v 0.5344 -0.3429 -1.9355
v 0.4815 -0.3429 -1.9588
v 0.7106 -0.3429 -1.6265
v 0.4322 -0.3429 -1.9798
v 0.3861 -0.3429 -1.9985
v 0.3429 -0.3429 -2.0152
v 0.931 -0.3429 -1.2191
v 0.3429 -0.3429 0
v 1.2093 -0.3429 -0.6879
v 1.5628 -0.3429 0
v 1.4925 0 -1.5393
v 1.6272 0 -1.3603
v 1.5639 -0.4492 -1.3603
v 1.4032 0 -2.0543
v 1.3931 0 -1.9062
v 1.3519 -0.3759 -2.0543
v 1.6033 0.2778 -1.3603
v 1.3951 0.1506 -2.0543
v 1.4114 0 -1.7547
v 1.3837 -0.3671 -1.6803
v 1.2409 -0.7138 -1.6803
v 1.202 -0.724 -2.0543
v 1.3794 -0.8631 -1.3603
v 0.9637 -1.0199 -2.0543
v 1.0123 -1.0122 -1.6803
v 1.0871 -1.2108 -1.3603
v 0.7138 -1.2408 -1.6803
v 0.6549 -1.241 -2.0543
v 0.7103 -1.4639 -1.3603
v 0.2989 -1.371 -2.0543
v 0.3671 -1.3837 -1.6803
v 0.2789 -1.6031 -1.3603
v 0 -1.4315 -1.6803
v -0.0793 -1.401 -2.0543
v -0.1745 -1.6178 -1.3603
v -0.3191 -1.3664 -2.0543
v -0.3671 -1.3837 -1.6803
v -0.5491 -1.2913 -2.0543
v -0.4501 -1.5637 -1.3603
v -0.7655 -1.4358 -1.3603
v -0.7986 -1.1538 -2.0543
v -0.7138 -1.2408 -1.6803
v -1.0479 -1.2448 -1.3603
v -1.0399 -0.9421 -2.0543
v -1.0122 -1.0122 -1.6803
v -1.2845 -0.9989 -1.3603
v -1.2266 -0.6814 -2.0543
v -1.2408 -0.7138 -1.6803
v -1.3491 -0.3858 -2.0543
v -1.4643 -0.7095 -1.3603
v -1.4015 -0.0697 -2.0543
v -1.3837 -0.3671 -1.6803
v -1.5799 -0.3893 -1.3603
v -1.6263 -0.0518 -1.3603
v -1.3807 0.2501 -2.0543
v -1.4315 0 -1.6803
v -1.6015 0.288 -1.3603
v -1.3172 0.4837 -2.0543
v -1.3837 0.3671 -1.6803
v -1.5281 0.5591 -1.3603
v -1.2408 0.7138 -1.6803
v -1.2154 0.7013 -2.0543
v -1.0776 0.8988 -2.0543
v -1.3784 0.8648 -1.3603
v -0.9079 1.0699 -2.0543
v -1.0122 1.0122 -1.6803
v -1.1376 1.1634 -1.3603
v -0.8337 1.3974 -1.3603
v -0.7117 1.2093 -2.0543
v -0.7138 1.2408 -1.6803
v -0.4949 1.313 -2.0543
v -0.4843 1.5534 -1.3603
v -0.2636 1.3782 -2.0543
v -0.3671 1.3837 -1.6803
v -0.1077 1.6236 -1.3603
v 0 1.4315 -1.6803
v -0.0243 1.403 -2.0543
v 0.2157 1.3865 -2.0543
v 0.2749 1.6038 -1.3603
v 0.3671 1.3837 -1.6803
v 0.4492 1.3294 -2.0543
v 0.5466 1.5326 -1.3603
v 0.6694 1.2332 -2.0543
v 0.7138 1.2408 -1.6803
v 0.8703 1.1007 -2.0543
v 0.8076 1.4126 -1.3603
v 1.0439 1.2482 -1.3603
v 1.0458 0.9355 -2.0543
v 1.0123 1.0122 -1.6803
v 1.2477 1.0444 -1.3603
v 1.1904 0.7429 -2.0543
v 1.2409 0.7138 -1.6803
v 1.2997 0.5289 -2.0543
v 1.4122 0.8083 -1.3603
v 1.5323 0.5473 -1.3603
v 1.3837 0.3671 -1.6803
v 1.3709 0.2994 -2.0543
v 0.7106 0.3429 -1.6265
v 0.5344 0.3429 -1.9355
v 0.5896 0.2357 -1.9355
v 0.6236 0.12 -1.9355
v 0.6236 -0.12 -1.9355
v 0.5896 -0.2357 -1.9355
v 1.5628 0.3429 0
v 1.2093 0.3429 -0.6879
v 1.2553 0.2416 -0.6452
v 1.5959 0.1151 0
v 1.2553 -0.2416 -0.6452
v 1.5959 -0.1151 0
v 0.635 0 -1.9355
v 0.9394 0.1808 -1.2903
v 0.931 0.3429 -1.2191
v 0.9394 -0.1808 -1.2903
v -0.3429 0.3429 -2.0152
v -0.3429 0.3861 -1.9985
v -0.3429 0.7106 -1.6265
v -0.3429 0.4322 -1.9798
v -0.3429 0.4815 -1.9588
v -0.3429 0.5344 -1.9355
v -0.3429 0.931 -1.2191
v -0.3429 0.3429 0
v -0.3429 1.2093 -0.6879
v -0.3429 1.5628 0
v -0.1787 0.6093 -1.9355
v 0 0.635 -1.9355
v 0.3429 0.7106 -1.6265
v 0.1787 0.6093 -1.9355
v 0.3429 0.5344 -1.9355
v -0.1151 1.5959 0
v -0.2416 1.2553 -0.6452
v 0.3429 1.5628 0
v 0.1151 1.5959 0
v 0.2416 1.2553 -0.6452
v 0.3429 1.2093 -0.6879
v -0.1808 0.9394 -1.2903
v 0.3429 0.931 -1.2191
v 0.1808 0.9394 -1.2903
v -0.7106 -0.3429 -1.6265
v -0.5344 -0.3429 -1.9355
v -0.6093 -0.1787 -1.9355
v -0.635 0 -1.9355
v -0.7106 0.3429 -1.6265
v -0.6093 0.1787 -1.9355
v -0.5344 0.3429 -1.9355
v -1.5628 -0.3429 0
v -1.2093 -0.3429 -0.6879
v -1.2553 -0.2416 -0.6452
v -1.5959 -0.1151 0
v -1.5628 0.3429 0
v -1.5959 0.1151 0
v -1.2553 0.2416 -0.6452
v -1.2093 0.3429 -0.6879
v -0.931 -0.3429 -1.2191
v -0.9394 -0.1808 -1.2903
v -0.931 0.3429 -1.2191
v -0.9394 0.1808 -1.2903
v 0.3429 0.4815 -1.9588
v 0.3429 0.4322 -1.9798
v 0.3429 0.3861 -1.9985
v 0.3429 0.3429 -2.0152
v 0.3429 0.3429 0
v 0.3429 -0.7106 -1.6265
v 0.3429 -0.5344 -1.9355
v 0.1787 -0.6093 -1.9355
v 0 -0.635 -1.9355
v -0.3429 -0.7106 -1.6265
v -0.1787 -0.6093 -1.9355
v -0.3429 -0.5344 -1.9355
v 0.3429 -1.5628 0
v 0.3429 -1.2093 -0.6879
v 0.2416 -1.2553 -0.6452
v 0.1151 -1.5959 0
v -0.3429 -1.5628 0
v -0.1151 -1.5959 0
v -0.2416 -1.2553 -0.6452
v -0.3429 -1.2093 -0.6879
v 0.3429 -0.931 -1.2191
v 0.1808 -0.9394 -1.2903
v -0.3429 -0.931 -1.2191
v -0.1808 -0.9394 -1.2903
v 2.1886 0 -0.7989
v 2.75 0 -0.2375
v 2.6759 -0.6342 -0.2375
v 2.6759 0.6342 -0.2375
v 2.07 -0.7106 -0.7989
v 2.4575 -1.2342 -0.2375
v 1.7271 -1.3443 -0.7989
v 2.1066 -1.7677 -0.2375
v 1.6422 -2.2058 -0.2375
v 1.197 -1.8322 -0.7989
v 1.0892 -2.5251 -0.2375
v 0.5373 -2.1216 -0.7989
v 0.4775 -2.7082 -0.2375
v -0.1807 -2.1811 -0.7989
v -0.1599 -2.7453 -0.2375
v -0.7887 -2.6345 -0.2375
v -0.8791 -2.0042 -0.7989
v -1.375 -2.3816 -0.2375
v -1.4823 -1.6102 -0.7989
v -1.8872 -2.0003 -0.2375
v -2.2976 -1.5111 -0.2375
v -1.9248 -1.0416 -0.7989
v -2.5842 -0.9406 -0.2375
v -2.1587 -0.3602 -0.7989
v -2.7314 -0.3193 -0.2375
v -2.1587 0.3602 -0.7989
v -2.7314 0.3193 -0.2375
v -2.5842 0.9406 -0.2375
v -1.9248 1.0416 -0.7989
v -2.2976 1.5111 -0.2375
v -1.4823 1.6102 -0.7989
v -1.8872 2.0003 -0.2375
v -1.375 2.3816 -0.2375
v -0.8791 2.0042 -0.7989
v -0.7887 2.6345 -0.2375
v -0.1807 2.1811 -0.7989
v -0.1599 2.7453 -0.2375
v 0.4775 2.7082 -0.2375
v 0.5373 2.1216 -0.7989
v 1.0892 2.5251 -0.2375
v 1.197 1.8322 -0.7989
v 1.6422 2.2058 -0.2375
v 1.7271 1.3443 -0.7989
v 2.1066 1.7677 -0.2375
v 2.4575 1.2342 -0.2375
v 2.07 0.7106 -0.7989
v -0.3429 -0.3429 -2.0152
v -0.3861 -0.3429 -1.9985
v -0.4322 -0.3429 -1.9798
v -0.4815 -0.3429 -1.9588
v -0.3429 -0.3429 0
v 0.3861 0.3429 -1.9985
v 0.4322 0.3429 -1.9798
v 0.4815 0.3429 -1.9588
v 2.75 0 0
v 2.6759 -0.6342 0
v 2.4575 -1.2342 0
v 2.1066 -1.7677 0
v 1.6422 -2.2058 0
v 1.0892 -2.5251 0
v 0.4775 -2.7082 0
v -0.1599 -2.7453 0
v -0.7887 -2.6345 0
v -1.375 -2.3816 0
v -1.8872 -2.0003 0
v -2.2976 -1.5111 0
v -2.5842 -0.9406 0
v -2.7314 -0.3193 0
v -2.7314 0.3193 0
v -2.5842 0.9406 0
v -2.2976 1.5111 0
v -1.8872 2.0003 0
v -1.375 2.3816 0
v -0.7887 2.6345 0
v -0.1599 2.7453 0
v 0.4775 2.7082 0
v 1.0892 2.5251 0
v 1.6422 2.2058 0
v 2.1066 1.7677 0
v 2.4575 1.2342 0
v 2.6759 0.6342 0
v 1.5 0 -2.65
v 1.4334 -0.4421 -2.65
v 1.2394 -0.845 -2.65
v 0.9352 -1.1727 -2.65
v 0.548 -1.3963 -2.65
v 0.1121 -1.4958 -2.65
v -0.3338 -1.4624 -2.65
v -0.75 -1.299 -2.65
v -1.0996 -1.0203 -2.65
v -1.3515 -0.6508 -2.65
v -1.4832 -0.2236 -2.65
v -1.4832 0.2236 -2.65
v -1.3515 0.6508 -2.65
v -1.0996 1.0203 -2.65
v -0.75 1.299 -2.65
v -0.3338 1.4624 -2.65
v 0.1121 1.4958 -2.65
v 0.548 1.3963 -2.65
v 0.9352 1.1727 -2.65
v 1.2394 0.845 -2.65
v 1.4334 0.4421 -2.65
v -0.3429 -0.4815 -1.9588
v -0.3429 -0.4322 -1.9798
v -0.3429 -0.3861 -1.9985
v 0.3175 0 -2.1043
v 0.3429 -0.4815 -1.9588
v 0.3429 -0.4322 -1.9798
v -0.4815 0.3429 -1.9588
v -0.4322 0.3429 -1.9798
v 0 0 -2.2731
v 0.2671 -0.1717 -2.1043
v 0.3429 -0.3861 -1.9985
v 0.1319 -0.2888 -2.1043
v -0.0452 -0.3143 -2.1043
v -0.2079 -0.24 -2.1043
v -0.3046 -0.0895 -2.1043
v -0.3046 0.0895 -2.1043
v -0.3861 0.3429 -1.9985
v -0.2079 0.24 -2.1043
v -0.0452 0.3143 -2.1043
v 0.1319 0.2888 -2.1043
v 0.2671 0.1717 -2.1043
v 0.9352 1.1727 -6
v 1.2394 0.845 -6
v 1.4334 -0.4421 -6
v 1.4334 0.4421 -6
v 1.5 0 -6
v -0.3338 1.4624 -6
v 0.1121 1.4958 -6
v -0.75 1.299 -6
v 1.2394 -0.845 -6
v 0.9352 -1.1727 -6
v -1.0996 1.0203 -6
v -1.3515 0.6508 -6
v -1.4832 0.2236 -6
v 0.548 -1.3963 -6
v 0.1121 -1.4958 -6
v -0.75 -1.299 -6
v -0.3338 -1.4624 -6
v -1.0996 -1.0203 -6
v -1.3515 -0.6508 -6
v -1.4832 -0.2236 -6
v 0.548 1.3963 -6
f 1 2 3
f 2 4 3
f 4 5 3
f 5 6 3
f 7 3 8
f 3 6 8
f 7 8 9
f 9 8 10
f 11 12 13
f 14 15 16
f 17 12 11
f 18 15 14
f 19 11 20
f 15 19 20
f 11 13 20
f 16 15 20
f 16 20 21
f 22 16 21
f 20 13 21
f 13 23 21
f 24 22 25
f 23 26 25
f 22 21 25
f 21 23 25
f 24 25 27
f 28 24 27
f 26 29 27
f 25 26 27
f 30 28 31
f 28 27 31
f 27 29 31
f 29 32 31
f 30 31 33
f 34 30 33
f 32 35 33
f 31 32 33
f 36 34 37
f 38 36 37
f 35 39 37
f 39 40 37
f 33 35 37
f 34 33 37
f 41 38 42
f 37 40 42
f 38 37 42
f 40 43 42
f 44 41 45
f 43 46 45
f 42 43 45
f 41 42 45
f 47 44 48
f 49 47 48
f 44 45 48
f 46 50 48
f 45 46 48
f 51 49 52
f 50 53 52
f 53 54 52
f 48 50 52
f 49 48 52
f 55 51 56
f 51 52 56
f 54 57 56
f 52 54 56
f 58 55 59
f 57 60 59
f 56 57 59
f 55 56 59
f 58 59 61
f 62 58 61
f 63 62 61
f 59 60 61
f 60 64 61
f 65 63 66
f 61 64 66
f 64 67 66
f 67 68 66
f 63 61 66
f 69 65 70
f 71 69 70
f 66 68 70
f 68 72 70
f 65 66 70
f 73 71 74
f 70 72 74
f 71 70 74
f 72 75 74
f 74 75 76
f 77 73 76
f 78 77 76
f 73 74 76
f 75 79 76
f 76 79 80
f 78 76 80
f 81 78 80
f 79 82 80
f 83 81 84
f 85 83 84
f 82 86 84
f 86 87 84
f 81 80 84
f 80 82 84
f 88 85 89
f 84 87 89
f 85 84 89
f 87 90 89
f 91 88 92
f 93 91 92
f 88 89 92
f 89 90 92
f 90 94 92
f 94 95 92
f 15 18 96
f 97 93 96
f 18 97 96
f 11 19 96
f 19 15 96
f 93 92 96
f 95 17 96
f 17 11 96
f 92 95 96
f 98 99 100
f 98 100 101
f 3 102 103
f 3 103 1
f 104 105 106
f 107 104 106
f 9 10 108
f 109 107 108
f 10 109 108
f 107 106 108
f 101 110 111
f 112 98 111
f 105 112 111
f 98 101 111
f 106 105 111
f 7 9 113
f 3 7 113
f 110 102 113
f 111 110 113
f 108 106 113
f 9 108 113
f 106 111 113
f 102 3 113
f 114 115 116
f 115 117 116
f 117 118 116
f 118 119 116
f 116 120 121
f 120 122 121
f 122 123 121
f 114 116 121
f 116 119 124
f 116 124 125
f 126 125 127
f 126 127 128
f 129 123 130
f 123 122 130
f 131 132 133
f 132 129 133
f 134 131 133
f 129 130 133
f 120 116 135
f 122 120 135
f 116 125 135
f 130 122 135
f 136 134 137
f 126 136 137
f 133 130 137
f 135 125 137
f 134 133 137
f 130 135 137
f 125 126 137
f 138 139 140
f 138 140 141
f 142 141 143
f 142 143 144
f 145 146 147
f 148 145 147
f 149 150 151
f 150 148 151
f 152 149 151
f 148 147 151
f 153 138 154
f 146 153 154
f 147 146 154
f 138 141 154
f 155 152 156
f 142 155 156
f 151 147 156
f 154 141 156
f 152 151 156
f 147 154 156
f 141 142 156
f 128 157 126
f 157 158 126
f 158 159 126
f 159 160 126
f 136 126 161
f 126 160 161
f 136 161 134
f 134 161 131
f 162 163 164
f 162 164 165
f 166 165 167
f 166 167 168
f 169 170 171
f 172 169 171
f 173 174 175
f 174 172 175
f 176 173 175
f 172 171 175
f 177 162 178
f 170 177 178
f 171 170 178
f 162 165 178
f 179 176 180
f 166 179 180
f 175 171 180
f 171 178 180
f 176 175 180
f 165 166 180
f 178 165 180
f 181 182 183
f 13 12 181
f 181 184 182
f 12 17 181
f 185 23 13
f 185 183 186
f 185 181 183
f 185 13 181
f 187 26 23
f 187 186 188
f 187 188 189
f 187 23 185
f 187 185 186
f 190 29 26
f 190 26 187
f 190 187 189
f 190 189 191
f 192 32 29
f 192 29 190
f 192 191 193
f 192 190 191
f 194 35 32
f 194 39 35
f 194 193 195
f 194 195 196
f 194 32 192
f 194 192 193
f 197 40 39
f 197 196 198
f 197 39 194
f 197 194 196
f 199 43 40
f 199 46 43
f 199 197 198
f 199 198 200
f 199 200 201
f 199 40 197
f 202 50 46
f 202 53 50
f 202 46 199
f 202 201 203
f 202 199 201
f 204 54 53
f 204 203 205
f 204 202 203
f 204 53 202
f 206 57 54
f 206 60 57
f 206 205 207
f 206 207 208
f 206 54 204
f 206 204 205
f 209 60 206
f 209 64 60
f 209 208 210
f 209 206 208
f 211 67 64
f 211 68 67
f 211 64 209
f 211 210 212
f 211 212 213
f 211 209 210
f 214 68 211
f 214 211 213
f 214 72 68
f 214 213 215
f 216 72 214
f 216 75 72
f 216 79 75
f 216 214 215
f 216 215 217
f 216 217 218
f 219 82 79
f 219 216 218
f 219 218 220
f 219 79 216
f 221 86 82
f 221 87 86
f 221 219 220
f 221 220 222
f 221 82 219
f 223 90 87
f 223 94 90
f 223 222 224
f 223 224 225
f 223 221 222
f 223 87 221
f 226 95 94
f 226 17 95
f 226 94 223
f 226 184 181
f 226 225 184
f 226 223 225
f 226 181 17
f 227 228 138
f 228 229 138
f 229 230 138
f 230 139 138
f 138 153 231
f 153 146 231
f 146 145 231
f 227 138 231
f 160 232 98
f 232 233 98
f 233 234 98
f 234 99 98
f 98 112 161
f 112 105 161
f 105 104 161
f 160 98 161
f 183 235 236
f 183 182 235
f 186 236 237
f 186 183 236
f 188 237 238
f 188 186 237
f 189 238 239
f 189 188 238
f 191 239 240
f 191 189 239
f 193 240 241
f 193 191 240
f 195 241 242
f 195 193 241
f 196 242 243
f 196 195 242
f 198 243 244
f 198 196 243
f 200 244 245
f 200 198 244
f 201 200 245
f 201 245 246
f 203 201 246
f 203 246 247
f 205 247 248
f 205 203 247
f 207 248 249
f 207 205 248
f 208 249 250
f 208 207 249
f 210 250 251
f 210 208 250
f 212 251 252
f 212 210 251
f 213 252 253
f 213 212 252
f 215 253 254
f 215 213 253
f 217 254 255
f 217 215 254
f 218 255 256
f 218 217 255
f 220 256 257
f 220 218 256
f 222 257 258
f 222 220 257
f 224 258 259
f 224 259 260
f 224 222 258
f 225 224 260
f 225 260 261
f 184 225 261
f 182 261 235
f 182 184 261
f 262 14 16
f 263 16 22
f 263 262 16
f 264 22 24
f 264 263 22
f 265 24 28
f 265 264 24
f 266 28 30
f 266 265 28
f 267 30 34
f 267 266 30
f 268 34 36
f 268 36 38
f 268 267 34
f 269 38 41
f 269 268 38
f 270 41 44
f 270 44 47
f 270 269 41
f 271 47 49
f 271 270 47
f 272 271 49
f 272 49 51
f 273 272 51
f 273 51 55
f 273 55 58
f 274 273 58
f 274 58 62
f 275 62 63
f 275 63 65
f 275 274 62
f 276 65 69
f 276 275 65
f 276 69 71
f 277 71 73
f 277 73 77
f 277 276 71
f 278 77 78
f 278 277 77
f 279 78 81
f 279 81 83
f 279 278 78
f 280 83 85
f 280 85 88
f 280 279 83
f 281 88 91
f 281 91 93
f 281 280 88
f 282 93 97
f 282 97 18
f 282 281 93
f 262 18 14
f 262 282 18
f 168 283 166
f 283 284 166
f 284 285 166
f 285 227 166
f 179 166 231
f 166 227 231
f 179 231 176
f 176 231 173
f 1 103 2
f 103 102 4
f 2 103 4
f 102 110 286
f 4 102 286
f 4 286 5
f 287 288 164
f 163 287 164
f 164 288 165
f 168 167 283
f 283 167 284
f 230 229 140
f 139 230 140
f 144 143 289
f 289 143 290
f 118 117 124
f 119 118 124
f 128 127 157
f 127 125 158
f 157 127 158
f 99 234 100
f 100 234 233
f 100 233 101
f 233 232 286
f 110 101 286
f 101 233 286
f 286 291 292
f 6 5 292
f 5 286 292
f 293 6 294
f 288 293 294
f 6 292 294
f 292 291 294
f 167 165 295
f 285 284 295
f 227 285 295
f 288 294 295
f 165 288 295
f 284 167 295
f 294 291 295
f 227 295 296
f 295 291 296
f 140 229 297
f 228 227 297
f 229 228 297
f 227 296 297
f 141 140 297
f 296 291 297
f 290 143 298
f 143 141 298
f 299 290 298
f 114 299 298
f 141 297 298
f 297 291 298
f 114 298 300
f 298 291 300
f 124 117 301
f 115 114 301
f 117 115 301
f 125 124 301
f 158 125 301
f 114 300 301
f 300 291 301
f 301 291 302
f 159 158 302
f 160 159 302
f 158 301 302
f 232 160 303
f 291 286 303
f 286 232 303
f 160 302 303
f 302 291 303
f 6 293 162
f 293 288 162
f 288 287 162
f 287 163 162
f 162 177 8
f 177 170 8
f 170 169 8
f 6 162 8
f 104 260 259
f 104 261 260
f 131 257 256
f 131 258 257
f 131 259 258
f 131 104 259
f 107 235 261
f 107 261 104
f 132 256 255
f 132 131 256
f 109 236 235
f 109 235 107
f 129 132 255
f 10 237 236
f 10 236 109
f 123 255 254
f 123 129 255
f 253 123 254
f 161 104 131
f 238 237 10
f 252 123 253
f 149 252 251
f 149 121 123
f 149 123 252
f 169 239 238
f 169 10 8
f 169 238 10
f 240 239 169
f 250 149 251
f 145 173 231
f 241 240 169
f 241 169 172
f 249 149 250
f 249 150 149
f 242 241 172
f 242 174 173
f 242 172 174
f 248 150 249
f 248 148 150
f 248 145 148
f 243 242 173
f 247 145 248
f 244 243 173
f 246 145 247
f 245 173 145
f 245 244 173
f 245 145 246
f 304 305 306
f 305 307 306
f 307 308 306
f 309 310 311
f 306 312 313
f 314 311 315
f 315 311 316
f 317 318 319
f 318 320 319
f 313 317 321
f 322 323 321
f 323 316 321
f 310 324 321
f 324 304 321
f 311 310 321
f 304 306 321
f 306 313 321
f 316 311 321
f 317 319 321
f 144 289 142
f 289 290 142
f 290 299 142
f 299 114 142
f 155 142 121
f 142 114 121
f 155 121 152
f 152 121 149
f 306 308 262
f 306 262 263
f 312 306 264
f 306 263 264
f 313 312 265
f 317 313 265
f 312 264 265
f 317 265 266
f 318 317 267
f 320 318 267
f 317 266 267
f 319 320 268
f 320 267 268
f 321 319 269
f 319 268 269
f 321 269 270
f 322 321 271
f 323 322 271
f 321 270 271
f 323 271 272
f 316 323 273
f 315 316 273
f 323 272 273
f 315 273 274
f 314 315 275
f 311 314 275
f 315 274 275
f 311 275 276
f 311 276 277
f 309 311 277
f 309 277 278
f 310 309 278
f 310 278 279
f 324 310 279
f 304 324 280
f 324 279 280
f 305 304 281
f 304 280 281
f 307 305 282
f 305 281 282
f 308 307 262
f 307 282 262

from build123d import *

# Parameters (mm, degrees)
CROSS_DEPTH       = 3.2
CIRPATTERN1_COUNT = 4
FILLET1_R         = 0.8


with BuildPart() as part:
    # Sketch1 → RevolveBase (revolve)
    with BuildSketch(Plane(origin=(0, 0, 0), x_dir=(0, 0, -1), z_dir=(1, 0, 0)), mode=Mode.PRIVATE) as revolvebase_sk:
        Polygon((0, 0), (0, 2.75), (0.2375, 2.75), (1.65, 1.3375), (1.65, 1.65), (6, 1.65), (6, 0), align=None)
    revolve(revolvebase_sk.sketch.rotate(Axis((0, 0, 0), (0, 0, -1)), 90), axis=Axis((0, 0, 0), (0, 0, -1)))

    # Sketch3 → Cross (cut)
    with BuildSketch(Plane.XY):
        with BuildLine():
            Line((-0.342946789, 0), (0.342946789, 0))
            Line((0.342946789, 0), (0.342946789, 1.562813968))
            ThreePointArc((0.342946789, 1.562813968), (0, 1.6), (-0.342946789, 1.562813968))
            Line((-0.342946789, 1.562813968), (-0.342946789, 0))
        make_face()
    cross = extrude(amount=-CROSS_DEPTH, mode=Mode.SUBTRACT)

    # CirPattern1: Cross ×4 about axis
    cirpattern1_axis = Axis((0, 0, 0), (0, 0, 1))
    for i in range(1, CIRPATTERN1_COUNT):
        add(cross.rotate(cirpattern1_axis, i * 360 / CIRPATTERN1_COUNT), mode=Mode.SUBTRACT)

    # Sketch5 → RevolveRod (revolve)
    with BuildSketch(Plane(origin=(0, 0, 0), x_dir=(0, 0, -1), z_dir=(1, 0, 0)), mode=Mode.PRIVATE) as revolverod_sk:
        Polygon((0, 2.102030651), (0, 1.6), (1.935490568, 0.635), (2.273126058, 0), (6, 0), (6, 1.5), (1.65, 1.5), (1.65, 1.3375), (0.885469349, 2.102030651), align=None)
    revolve(revolverod_sk.sketch.rotate(Axis((0, 0, 0), (0, 0, -1)), 90), axis=Axis((0, 0, 0), (0, 0, -1)))

    # Sketch7 → CutBody (revolve, cut)
    with BuildSketch(Plane(origin=(0, 0, 0), x_dir=(0, 0, -1), z_dir=(1, 0, 0)), mode=Mode.PRIVATE) as cutbody_sk:
        Polygon((1.65, 3.5), (1.65, 1.3375), (2.65, 1.5), (6, 1.5), (6, 3.5), align=None)
    revolve(cutbody_sk.sketch.rotate(Axis((0, 0, 0), (0, 0, -1)), 90), axis=Axis((0, 0, 0), (0, 0, -1)), mode=Mode.SUBTRACT)

    # Fillet1
    fillet1_edges = [part.edges().sort_by_distance(p)[0] for p in [
        (1.326274207, -0.172924772, -1.65),
    ]]
    fillet(fillet1_edges, radius=FILLET1_R)


solid = part.part
